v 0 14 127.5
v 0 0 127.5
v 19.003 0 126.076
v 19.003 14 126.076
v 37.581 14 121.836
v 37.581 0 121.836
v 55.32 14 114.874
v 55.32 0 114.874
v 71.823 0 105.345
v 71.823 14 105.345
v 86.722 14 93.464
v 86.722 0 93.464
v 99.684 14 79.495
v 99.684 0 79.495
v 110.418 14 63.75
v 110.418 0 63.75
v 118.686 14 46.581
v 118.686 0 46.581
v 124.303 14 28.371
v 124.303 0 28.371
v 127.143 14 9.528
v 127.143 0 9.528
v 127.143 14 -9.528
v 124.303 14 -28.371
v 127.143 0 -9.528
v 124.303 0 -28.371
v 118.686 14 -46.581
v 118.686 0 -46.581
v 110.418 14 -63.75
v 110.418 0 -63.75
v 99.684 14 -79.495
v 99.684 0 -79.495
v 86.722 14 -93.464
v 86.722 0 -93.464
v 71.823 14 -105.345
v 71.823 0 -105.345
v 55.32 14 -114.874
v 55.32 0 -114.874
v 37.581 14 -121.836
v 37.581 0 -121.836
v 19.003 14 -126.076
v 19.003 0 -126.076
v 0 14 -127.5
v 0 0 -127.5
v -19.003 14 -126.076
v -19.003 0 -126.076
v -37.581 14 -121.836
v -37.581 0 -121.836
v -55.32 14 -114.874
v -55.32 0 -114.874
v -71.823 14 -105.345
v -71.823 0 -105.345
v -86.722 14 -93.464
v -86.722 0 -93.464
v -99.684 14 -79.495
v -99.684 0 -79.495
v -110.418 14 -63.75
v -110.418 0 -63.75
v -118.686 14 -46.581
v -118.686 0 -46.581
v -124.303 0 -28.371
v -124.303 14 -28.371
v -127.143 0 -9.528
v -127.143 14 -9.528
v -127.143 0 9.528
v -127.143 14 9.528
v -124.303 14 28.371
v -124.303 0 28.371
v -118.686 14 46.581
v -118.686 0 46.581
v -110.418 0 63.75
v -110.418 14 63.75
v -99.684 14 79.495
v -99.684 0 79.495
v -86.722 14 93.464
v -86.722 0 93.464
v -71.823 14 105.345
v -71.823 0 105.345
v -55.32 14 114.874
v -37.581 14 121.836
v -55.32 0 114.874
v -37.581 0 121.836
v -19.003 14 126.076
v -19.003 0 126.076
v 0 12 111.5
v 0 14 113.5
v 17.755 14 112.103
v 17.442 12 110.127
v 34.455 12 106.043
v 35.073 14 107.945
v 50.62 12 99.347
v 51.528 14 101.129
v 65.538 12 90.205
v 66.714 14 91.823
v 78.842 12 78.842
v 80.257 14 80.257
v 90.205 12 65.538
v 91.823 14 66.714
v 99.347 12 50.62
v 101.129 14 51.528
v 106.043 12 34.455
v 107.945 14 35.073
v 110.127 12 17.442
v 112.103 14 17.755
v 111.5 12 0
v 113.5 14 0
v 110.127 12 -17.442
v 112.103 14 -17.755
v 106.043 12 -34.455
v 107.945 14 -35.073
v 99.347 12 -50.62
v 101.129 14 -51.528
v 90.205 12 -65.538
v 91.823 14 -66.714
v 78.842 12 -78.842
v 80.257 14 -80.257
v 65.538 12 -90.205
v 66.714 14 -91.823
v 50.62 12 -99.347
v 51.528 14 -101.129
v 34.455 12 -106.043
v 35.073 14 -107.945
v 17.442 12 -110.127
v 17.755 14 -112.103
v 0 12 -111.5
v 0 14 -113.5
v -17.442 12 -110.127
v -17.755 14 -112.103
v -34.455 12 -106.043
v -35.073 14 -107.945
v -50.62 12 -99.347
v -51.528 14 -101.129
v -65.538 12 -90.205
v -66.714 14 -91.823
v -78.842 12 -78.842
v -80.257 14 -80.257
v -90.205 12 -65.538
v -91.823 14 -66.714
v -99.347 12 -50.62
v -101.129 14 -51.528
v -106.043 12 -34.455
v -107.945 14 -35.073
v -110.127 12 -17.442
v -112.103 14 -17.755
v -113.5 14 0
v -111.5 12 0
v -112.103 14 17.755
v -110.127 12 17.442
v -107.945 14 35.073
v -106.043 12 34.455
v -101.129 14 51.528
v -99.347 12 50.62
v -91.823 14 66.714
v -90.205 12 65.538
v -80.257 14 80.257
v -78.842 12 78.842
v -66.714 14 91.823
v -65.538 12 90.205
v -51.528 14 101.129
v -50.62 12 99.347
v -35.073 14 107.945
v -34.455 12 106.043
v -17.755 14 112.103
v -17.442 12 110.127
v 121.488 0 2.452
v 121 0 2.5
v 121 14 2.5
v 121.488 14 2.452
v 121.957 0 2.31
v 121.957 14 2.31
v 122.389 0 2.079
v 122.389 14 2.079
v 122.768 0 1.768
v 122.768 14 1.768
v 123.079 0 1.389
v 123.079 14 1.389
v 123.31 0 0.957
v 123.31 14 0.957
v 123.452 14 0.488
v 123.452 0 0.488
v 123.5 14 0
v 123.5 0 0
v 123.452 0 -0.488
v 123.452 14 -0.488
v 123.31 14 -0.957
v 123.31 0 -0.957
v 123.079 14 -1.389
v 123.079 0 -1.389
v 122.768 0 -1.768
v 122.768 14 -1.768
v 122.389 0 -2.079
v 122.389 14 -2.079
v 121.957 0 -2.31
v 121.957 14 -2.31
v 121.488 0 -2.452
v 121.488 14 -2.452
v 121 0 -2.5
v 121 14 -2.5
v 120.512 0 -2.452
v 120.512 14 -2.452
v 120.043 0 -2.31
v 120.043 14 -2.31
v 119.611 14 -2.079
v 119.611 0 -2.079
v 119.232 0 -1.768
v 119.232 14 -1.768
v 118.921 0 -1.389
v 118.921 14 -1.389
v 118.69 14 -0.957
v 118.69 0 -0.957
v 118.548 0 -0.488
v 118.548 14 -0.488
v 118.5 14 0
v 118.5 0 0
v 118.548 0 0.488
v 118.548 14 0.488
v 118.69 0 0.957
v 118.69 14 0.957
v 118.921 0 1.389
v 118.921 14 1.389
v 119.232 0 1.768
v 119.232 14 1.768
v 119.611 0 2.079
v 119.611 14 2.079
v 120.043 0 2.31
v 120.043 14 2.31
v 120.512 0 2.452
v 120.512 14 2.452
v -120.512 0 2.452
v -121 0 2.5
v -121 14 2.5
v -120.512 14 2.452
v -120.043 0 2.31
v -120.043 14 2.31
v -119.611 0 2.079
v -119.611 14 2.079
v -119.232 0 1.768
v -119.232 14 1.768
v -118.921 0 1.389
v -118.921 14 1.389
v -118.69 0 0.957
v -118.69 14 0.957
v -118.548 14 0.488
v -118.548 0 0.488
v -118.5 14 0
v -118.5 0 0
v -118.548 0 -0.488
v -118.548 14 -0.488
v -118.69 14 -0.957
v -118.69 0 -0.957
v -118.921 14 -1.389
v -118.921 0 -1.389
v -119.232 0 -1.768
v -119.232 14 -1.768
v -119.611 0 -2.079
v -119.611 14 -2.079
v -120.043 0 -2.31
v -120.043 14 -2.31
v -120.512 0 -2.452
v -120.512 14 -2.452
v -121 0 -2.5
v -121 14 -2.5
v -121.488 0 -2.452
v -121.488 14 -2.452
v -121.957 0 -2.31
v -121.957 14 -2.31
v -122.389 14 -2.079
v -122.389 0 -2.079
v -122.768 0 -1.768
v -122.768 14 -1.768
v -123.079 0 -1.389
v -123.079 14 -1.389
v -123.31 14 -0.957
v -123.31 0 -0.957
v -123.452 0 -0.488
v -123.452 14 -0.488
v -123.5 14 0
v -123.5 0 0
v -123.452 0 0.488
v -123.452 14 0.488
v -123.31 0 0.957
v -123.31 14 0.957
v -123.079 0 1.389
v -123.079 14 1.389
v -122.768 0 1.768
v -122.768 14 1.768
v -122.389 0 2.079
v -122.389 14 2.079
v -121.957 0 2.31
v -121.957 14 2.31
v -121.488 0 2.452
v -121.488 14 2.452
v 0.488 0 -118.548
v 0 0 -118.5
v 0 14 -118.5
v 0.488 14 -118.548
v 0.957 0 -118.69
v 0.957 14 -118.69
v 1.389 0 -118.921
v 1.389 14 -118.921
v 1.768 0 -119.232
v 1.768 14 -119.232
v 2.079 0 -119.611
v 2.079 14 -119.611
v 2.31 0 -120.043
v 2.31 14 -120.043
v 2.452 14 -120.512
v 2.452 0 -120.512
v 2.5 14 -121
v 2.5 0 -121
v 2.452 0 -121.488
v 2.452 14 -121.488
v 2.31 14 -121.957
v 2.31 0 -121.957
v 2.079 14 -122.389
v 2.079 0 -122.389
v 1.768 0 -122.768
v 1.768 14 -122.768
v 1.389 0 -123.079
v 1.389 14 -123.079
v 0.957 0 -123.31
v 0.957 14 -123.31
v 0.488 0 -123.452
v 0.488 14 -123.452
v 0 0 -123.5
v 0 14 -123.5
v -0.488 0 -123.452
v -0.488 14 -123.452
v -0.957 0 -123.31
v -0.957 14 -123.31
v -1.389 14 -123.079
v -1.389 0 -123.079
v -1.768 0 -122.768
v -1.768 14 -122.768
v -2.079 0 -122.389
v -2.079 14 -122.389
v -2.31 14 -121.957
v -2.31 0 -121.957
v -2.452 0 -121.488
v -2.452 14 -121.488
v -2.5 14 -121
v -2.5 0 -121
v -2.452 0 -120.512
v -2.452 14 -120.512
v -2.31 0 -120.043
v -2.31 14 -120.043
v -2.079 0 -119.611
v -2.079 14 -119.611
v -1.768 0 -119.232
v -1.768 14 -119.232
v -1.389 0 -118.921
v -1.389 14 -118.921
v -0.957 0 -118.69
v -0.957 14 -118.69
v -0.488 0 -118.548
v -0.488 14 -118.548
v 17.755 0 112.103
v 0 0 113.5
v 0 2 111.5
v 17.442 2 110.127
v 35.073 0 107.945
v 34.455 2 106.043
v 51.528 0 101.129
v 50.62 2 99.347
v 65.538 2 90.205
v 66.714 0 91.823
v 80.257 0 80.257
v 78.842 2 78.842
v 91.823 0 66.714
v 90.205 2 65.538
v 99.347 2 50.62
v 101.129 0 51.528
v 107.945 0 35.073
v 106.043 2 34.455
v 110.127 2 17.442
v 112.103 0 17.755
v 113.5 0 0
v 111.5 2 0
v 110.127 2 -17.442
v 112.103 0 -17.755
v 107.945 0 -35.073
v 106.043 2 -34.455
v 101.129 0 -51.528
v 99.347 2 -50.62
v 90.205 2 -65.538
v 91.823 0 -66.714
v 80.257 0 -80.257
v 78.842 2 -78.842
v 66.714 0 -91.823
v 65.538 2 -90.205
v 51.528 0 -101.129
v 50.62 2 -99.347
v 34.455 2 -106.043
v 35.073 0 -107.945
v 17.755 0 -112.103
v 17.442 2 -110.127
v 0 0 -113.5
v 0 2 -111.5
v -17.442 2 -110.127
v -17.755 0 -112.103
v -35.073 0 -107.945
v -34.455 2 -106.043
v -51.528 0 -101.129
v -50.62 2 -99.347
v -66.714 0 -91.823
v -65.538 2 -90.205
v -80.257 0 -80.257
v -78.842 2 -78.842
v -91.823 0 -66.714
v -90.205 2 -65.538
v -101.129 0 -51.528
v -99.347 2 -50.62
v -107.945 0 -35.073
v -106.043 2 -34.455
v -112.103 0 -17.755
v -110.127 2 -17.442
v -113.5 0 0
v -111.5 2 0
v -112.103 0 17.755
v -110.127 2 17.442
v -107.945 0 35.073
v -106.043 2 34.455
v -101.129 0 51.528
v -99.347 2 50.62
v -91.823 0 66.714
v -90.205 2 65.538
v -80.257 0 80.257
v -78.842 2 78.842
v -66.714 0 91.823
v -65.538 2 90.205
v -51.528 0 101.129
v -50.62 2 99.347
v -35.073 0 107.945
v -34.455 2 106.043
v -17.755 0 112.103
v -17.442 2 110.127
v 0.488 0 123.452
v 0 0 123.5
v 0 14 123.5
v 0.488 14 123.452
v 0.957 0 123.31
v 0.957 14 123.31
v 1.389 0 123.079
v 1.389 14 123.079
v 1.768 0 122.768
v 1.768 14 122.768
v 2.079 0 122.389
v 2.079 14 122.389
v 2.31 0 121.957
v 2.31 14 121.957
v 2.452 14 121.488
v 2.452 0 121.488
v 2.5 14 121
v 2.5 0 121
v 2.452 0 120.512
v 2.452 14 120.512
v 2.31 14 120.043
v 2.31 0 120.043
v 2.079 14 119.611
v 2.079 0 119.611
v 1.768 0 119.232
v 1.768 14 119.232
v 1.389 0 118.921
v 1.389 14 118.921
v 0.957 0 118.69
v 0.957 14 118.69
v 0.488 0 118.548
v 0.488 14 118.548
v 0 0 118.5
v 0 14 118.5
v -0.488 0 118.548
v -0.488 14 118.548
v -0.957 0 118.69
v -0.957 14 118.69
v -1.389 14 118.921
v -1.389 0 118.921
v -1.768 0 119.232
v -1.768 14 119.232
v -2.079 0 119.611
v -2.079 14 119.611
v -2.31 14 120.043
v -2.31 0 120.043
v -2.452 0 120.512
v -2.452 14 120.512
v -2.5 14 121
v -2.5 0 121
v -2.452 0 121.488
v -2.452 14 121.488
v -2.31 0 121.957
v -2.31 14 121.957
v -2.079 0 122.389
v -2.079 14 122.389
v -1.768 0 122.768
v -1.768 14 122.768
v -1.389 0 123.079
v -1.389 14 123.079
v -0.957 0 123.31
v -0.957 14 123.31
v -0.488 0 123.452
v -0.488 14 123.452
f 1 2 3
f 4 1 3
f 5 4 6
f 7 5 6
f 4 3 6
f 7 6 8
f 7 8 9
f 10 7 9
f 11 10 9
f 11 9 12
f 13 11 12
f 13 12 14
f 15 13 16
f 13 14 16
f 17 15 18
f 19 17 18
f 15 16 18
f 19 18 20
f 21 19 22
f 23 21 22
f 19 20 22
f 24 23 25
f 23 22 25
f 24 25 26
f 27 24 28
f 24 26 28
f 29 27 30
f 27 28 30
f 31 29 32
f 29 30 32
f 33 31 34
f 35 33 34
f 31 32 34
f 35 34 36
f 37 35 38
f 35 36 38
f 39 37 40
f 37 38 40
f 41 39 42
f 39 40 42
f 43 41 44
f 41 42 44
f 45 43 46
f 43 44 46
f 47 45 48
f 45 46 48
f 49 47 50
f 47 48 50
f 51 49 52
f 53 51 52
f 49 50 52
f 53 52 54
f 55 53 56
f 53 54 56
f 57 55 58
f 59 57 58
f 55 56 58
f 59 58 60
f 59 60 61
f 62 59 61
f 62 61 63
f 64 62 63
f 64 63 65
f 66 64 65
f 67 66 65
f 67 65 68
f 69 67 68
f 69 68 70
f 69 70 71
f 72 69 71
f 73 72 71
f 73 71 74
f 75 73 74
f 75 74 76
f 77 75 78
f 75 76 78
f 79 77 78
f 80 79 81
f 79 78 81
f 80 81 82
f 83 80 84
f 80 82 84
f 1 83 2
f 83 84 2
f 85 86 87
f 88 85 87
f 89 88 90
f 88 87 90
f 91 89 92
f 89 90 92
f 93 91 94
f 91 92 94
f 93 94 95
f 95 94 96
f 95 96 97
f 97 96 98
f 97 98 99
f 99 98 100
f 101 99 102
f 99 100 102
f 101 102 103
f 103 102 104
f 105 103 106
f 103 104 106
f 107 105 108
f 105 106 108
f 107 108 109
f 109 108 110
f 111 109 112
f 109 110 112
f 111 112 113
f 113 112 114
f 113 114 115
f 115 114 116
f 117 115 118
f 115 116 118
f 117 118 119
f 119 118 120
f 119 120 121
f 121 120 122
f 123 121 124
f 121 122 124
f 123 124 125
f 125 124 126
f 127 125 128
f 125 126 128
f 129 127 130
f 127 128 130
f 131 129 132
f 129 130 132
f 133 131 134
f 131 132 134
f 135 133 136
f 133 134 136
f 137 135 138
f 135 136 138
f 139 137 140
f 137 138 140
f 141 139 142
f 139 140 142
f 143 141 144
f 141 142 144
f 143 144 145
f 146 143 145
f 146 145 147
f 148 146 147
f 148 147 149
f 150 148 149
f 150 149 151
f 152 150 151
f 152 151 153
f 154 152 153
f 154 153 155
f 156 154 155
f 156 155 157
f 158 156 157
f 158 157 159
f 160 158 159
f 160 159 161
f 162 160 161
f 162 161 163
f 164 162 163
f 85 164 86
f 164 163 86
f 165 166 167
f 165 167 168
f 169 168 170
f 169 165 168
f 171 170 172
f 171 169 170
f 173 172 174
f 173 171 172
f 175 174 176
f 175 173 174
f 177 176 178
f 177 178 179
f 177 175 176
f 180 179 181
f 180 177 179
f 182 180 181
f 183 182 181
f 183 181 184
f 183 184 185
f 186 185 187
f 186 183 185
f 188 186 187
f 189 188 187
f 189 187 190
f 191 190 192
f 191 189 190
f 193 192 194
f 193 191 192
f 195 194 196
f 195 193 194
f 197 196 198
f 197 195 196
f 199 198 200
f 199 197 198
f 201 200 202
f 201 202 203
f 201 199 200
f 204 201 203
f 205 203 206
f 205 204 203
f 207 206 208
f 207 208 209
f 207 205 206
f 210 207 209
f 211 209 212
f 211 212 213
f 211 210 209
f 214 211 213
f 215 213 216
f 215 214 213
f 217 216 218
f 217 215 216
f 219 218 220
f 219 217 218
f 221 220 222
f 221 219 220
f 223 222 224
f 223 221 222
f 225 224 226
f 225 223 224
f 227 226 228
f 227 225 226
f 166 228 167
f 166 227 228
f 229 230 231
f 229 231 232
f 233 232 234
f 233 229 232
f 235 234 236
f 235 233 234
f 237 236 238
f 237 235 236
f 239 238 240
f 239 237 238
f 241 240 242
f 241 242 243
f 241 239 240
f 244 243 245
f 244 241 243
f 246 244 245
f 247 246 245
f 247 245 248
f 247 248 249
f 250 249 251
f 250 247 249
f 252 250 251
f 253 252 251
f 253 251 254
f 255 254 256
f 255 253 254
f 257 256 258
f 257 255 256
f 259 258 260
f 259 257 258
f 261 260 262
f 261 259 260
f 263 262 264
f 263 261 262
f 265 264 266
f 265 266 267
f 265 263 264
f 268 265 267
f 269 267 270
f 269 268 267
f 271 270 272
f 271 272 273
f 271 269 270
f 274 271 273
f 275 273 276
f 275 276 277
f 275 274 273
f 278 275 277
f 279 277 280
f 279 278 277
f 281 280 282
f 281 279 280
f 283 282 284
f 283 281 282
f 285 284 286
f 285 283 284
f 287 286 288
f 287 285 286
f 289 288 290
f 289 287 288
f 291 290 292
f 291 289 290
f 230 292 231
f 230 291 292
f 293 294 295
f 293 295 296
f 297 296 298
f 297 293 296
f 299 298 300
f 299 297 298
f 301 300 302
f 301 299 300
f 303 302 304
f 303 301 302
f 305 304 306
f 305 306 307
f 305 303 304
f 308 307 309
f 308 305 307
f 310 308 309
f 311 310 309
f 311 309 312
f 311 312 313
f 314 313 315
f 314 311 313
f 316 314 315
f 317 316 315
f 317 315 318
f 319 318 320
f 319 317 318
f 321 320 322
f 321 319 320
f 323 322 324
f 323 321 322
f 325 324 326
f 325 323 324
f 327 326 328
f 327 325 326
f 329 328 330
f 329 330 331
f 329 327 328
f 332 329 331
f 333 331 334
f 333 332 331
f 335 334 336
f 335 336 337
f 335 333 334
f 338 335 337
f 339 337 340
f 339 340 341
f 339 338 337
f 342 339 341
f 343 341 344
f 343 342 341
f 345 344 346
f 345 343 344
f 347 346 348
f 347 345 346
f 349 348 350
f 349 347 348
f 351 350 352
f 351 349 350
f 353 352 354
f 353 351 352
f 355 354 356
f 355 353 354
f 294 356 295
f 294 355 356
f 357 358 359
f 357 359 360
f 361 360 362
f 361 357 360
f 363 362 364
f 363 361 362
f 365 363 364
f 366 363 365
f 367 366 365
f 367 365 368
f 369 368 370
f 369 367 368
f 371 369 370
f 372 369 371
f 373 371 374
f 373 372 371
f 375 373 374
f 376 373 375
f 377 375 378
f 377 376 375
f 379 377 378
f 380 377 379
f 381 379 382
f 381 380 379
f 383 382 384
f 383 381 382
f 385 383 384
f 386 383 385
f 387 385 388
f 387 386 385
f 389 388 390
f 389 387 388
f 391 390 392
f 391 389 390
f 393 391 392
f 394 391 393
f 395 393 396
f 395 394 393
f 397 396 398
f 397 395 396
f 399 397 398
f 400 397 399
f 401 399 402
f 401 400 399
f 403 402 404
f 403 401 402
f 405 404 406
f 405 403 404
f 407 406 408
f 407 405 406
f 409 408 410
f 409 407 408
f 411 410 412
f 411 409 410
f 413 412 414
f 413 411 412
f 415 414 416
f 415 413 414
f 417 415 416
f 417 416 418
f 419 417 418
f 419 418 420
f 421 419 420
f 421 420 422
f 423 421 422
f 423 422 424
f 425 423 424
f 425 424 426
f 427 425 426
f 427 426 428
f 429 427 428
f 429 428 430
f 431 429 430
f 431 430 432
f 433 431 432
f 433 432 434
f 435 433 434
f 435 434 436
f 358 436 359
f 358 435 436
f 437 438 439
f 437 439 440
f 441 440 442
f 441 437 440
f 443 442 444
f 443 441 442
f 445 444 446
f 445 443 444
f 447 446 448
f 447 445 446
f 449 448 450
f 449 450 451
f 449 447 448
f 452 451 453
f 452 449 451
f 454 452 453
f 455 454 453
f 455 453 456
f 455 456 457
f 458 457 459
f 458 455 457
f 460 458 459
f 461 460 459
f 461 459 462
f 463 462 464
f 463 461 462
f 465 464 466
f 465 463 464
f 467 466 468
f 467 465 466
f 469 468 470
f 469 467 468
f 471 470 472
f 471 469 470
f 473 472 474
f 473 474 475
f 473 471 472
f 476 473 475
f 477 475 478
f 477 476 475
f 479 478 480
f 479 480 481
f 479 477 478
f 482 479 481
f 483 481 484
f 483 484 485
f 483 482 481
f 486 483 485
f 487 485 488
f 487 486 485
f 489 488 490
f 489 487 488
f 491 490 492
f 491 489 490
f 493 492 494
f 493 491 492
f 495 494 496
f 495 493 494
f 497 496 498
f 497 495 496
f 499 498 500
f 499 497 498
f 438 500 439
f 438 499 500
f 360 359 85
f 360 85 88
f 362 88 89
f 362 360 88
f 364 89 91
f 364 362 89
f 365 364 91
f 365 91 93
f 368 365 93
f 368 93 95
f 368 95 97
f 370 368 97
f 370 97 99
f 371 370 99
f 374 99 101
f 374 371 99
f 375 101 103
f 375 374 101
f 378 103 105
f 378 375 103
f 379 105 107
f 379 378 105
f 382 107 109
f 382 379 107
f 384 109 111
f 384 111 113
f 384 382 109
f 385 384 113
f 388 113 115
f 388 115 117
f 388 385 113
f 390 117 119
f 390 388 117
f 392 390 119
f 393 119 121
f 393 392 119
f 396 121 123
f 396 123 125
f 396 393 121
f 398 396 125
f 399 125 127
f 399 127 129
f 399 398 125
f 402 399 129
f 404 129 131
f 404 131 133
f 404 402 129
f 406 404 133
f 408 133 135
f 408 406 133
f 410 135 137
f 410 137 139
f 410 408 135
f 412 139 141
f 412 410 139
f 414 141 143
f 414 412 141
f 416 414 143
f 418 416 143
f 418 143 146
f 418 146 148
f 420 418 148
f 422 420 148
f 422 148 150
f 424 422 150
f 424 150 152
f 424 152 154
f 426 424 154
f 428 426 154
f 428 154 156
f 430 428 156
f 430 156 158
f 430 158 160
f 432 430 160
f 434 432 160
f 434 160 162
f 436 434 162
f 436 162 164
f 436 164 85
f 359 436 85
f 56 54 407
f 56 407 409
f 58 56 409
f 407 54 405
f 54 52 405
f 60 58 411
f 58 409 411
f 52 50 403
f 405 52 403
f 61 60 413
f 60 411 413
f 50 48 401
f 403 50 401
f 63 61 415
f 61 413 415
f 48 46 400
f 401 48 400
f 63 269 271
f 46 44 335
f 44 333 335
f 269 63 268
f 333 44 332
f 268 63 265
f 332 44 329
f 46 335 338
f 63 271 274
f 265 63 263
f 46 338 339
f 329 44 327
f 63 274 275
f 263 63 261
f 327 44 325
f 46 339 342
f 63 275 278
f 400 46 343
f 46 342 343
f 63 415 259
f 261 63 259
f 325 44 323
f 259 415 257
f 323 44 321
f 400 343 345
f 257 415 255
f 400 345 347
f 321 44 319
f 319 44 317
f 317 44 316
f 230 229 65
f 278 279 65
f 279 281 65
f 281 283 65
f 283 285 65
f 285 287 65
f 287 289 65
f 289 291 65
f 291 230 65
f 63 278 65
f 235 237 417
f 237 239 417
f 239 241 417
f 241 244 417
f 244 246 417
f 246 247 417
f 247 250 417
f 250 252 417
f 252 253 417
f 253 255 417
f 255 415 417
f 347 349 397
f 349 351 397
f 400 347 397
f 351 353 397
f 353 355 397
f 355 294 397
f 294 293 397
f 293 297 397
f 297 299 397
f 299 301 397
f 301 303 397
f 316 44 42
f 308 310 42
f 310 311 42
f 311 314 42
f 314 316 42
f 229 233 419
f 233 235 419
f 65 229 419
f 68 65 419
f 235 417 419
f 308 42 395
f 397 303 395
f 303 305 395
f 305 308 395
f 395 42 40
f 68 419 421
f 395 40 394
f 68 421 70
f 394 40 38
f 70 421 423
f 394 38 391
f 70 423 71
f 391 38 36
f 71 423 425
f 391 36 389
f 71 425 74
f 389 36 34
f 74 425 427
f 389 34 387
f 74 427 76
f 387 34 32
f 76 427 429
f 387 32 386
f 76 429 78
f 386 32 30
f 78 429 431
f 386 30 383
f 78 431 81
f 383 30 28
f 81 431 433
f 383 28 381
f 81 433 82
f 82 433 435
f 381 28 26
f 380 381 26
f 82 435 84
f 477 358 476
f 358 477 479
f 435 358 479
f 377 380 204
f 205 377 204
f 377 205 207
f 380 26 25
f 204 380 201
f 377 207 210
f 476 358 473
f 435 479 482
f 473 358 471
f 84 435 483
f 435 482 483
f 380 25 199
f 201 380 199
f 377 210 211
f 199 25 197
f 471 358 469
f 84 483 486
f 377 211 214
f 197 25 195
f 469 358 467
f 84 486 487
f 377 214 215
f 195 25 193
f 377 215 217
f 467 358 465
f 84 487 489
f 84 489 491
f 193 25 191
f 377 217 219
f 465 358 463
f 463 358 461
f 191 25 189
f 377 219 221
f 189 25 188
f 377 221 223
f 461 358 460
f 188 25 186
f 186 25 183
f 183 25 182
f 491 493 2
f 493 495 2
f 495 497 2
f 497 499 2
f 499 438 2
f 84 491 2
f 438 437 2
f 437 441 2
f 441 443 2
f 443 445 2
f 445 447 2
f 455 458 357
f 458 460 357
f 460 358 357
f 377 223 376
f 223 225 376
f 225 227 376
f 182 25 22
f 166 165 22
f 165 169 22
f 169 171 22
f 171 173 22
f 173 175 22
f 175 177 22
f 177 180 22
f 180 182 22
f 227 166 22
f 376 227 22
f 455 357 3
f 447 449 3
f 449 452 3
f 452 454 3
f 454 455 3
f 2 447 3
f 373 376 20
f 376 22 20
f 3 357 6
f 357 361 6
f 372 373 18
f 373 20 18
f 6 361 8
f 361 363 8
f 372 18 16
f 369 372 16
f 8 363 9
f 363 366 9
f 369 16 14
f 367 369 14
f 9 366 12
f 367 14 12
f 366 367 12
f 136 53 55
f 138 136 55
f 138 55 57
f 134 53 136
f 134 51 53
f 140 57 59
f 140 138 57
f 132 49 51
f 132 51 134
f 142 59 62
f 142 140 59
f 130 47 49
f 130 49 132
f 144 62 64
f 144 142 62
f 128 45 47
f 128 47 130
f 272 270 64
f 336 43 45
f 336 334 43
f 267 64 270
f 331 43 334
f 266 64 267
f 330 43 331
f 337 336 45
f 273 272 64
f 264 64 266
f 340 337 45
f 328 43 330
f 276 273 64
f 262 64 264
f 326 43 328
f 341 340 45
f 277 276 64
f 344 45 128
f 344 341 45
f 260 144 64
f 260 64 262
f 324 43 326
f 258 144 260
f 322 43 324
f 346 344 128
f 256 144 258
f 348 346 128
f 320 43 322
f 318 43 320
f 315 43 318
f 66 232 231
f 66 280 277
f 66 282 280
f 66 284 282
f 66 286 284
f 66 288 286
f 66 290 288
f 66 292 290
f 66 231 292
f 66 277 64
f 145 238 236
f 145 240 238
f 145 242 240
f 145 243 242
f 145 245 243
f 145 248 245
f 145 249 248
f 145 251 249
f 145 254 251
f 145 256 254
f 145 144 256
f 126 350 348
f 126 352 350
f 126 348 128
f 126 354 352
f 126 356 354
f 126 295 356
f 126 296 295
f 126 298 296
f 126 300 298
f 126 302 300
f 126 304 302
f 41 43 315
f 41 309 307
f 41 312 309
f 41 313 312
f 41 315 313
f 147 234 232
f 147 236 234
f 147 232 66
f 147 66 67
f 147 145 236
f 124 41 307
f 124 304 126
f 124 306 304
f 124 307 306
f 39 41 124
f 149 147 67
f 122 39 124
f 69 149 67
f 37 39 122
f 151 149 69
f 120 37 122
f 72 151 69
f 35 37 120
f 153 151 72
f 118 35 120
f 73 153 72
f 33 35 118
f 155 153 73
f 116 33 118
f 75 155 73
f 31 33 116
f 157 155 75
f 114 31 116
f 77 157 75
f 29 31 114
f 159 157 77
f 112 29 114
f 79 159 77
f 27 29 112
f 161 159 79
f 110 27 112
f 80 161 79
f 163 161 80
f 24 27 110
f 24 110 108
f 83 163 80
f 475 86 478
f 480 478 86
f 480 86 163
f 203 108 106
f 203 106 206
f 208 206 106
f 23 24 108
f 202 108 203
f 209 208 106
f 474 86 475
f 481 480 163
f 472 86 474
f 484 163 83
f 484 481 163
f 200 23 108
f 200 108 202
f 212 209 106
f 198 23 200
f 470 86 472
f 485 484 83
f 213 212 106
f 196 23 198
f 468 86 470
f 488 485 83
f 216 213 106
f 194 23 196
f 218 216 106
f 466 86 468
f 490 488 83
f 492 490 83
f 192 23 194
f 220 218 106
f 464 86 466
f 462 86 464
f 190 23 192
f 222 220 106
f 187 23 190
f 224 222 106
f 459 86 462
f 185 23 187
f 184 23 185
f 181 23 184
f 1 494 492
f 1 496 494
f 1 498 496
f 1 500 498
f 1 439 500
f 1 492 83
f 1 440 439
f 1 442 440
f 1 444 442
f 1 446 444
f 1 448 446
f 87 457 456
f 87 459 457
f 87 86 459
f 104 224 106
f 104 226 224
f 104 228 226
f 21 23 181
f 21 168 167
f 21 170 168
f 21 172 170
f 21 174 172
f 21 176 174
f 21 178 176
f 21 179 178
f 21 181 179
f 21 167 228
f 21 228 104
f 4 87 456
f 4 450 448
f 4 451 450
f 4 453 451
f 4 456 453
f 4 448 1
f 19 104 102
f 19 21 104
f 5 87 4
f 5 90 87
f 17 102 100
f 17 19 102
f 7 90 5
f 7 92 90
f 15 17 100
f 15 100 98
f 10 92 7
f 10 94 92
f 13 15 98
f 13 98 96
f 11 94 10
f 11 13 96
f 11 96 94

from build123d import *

# Parameters (mm, degrees)
SKETCH1_R           = 127.5
SKETCH1_R_2         = 111.5
SKETCH1_R_3         = 2.5
BOSS_EXTRUDE1_DEPTH = 14
CHAMFER1_SIZE       = 2


with BuildPart() as part:
    # Sketch1 → Boss-Extrude1 (new body)
    with BuildSketch(Plane(origin=(0, 0, 0), x_dir=(1, 0, 0), z_dir=(0, 1, 0))):
        with Locations(Location((0, 0, 0), (0, 0, 270))):
            Circle(SKETCH1_R)
        with Locations(Location((0, 0, 0), (0, 0, 270))):
            Circle(SKETCH1_R_2, mode=Mode.SUBTRACT)
        with Locations(Location((0, 121, 0), (0, 0, 270))):
            Circle(SKETCH1_R_3, mode=Mode.SUBTRACT)
        with Locations(Location((121, 0, 0), (0, 0, 270))):
            Circle(SKETCH1_R_3, mode=Mode.SUBTRACT)
        with Locations(Location((0, -121, 0), (0, 0, 270))):
            Circle(SKETCH1_R_3, mode=Mode.SUBTRACT)
        with Locations(Location((-121, 0, 0), (0, 0, 270))):
            Circle(SKETCH1_R_3, mode=Mode.SUBTRACT)
    extrude(amount=BOSS_EXTRUDE1_DEPTH)

    # Chamfer1
    chamfer1_edges = [part.edges().sort_by_distance(p)[0] for p in [
        (0, 0, -111.5),
        (0, 14, -111.5),
    ]]
    chamfer(chamfer1_edges, length=CHAMFER1_SIZE)


solid = part.part
